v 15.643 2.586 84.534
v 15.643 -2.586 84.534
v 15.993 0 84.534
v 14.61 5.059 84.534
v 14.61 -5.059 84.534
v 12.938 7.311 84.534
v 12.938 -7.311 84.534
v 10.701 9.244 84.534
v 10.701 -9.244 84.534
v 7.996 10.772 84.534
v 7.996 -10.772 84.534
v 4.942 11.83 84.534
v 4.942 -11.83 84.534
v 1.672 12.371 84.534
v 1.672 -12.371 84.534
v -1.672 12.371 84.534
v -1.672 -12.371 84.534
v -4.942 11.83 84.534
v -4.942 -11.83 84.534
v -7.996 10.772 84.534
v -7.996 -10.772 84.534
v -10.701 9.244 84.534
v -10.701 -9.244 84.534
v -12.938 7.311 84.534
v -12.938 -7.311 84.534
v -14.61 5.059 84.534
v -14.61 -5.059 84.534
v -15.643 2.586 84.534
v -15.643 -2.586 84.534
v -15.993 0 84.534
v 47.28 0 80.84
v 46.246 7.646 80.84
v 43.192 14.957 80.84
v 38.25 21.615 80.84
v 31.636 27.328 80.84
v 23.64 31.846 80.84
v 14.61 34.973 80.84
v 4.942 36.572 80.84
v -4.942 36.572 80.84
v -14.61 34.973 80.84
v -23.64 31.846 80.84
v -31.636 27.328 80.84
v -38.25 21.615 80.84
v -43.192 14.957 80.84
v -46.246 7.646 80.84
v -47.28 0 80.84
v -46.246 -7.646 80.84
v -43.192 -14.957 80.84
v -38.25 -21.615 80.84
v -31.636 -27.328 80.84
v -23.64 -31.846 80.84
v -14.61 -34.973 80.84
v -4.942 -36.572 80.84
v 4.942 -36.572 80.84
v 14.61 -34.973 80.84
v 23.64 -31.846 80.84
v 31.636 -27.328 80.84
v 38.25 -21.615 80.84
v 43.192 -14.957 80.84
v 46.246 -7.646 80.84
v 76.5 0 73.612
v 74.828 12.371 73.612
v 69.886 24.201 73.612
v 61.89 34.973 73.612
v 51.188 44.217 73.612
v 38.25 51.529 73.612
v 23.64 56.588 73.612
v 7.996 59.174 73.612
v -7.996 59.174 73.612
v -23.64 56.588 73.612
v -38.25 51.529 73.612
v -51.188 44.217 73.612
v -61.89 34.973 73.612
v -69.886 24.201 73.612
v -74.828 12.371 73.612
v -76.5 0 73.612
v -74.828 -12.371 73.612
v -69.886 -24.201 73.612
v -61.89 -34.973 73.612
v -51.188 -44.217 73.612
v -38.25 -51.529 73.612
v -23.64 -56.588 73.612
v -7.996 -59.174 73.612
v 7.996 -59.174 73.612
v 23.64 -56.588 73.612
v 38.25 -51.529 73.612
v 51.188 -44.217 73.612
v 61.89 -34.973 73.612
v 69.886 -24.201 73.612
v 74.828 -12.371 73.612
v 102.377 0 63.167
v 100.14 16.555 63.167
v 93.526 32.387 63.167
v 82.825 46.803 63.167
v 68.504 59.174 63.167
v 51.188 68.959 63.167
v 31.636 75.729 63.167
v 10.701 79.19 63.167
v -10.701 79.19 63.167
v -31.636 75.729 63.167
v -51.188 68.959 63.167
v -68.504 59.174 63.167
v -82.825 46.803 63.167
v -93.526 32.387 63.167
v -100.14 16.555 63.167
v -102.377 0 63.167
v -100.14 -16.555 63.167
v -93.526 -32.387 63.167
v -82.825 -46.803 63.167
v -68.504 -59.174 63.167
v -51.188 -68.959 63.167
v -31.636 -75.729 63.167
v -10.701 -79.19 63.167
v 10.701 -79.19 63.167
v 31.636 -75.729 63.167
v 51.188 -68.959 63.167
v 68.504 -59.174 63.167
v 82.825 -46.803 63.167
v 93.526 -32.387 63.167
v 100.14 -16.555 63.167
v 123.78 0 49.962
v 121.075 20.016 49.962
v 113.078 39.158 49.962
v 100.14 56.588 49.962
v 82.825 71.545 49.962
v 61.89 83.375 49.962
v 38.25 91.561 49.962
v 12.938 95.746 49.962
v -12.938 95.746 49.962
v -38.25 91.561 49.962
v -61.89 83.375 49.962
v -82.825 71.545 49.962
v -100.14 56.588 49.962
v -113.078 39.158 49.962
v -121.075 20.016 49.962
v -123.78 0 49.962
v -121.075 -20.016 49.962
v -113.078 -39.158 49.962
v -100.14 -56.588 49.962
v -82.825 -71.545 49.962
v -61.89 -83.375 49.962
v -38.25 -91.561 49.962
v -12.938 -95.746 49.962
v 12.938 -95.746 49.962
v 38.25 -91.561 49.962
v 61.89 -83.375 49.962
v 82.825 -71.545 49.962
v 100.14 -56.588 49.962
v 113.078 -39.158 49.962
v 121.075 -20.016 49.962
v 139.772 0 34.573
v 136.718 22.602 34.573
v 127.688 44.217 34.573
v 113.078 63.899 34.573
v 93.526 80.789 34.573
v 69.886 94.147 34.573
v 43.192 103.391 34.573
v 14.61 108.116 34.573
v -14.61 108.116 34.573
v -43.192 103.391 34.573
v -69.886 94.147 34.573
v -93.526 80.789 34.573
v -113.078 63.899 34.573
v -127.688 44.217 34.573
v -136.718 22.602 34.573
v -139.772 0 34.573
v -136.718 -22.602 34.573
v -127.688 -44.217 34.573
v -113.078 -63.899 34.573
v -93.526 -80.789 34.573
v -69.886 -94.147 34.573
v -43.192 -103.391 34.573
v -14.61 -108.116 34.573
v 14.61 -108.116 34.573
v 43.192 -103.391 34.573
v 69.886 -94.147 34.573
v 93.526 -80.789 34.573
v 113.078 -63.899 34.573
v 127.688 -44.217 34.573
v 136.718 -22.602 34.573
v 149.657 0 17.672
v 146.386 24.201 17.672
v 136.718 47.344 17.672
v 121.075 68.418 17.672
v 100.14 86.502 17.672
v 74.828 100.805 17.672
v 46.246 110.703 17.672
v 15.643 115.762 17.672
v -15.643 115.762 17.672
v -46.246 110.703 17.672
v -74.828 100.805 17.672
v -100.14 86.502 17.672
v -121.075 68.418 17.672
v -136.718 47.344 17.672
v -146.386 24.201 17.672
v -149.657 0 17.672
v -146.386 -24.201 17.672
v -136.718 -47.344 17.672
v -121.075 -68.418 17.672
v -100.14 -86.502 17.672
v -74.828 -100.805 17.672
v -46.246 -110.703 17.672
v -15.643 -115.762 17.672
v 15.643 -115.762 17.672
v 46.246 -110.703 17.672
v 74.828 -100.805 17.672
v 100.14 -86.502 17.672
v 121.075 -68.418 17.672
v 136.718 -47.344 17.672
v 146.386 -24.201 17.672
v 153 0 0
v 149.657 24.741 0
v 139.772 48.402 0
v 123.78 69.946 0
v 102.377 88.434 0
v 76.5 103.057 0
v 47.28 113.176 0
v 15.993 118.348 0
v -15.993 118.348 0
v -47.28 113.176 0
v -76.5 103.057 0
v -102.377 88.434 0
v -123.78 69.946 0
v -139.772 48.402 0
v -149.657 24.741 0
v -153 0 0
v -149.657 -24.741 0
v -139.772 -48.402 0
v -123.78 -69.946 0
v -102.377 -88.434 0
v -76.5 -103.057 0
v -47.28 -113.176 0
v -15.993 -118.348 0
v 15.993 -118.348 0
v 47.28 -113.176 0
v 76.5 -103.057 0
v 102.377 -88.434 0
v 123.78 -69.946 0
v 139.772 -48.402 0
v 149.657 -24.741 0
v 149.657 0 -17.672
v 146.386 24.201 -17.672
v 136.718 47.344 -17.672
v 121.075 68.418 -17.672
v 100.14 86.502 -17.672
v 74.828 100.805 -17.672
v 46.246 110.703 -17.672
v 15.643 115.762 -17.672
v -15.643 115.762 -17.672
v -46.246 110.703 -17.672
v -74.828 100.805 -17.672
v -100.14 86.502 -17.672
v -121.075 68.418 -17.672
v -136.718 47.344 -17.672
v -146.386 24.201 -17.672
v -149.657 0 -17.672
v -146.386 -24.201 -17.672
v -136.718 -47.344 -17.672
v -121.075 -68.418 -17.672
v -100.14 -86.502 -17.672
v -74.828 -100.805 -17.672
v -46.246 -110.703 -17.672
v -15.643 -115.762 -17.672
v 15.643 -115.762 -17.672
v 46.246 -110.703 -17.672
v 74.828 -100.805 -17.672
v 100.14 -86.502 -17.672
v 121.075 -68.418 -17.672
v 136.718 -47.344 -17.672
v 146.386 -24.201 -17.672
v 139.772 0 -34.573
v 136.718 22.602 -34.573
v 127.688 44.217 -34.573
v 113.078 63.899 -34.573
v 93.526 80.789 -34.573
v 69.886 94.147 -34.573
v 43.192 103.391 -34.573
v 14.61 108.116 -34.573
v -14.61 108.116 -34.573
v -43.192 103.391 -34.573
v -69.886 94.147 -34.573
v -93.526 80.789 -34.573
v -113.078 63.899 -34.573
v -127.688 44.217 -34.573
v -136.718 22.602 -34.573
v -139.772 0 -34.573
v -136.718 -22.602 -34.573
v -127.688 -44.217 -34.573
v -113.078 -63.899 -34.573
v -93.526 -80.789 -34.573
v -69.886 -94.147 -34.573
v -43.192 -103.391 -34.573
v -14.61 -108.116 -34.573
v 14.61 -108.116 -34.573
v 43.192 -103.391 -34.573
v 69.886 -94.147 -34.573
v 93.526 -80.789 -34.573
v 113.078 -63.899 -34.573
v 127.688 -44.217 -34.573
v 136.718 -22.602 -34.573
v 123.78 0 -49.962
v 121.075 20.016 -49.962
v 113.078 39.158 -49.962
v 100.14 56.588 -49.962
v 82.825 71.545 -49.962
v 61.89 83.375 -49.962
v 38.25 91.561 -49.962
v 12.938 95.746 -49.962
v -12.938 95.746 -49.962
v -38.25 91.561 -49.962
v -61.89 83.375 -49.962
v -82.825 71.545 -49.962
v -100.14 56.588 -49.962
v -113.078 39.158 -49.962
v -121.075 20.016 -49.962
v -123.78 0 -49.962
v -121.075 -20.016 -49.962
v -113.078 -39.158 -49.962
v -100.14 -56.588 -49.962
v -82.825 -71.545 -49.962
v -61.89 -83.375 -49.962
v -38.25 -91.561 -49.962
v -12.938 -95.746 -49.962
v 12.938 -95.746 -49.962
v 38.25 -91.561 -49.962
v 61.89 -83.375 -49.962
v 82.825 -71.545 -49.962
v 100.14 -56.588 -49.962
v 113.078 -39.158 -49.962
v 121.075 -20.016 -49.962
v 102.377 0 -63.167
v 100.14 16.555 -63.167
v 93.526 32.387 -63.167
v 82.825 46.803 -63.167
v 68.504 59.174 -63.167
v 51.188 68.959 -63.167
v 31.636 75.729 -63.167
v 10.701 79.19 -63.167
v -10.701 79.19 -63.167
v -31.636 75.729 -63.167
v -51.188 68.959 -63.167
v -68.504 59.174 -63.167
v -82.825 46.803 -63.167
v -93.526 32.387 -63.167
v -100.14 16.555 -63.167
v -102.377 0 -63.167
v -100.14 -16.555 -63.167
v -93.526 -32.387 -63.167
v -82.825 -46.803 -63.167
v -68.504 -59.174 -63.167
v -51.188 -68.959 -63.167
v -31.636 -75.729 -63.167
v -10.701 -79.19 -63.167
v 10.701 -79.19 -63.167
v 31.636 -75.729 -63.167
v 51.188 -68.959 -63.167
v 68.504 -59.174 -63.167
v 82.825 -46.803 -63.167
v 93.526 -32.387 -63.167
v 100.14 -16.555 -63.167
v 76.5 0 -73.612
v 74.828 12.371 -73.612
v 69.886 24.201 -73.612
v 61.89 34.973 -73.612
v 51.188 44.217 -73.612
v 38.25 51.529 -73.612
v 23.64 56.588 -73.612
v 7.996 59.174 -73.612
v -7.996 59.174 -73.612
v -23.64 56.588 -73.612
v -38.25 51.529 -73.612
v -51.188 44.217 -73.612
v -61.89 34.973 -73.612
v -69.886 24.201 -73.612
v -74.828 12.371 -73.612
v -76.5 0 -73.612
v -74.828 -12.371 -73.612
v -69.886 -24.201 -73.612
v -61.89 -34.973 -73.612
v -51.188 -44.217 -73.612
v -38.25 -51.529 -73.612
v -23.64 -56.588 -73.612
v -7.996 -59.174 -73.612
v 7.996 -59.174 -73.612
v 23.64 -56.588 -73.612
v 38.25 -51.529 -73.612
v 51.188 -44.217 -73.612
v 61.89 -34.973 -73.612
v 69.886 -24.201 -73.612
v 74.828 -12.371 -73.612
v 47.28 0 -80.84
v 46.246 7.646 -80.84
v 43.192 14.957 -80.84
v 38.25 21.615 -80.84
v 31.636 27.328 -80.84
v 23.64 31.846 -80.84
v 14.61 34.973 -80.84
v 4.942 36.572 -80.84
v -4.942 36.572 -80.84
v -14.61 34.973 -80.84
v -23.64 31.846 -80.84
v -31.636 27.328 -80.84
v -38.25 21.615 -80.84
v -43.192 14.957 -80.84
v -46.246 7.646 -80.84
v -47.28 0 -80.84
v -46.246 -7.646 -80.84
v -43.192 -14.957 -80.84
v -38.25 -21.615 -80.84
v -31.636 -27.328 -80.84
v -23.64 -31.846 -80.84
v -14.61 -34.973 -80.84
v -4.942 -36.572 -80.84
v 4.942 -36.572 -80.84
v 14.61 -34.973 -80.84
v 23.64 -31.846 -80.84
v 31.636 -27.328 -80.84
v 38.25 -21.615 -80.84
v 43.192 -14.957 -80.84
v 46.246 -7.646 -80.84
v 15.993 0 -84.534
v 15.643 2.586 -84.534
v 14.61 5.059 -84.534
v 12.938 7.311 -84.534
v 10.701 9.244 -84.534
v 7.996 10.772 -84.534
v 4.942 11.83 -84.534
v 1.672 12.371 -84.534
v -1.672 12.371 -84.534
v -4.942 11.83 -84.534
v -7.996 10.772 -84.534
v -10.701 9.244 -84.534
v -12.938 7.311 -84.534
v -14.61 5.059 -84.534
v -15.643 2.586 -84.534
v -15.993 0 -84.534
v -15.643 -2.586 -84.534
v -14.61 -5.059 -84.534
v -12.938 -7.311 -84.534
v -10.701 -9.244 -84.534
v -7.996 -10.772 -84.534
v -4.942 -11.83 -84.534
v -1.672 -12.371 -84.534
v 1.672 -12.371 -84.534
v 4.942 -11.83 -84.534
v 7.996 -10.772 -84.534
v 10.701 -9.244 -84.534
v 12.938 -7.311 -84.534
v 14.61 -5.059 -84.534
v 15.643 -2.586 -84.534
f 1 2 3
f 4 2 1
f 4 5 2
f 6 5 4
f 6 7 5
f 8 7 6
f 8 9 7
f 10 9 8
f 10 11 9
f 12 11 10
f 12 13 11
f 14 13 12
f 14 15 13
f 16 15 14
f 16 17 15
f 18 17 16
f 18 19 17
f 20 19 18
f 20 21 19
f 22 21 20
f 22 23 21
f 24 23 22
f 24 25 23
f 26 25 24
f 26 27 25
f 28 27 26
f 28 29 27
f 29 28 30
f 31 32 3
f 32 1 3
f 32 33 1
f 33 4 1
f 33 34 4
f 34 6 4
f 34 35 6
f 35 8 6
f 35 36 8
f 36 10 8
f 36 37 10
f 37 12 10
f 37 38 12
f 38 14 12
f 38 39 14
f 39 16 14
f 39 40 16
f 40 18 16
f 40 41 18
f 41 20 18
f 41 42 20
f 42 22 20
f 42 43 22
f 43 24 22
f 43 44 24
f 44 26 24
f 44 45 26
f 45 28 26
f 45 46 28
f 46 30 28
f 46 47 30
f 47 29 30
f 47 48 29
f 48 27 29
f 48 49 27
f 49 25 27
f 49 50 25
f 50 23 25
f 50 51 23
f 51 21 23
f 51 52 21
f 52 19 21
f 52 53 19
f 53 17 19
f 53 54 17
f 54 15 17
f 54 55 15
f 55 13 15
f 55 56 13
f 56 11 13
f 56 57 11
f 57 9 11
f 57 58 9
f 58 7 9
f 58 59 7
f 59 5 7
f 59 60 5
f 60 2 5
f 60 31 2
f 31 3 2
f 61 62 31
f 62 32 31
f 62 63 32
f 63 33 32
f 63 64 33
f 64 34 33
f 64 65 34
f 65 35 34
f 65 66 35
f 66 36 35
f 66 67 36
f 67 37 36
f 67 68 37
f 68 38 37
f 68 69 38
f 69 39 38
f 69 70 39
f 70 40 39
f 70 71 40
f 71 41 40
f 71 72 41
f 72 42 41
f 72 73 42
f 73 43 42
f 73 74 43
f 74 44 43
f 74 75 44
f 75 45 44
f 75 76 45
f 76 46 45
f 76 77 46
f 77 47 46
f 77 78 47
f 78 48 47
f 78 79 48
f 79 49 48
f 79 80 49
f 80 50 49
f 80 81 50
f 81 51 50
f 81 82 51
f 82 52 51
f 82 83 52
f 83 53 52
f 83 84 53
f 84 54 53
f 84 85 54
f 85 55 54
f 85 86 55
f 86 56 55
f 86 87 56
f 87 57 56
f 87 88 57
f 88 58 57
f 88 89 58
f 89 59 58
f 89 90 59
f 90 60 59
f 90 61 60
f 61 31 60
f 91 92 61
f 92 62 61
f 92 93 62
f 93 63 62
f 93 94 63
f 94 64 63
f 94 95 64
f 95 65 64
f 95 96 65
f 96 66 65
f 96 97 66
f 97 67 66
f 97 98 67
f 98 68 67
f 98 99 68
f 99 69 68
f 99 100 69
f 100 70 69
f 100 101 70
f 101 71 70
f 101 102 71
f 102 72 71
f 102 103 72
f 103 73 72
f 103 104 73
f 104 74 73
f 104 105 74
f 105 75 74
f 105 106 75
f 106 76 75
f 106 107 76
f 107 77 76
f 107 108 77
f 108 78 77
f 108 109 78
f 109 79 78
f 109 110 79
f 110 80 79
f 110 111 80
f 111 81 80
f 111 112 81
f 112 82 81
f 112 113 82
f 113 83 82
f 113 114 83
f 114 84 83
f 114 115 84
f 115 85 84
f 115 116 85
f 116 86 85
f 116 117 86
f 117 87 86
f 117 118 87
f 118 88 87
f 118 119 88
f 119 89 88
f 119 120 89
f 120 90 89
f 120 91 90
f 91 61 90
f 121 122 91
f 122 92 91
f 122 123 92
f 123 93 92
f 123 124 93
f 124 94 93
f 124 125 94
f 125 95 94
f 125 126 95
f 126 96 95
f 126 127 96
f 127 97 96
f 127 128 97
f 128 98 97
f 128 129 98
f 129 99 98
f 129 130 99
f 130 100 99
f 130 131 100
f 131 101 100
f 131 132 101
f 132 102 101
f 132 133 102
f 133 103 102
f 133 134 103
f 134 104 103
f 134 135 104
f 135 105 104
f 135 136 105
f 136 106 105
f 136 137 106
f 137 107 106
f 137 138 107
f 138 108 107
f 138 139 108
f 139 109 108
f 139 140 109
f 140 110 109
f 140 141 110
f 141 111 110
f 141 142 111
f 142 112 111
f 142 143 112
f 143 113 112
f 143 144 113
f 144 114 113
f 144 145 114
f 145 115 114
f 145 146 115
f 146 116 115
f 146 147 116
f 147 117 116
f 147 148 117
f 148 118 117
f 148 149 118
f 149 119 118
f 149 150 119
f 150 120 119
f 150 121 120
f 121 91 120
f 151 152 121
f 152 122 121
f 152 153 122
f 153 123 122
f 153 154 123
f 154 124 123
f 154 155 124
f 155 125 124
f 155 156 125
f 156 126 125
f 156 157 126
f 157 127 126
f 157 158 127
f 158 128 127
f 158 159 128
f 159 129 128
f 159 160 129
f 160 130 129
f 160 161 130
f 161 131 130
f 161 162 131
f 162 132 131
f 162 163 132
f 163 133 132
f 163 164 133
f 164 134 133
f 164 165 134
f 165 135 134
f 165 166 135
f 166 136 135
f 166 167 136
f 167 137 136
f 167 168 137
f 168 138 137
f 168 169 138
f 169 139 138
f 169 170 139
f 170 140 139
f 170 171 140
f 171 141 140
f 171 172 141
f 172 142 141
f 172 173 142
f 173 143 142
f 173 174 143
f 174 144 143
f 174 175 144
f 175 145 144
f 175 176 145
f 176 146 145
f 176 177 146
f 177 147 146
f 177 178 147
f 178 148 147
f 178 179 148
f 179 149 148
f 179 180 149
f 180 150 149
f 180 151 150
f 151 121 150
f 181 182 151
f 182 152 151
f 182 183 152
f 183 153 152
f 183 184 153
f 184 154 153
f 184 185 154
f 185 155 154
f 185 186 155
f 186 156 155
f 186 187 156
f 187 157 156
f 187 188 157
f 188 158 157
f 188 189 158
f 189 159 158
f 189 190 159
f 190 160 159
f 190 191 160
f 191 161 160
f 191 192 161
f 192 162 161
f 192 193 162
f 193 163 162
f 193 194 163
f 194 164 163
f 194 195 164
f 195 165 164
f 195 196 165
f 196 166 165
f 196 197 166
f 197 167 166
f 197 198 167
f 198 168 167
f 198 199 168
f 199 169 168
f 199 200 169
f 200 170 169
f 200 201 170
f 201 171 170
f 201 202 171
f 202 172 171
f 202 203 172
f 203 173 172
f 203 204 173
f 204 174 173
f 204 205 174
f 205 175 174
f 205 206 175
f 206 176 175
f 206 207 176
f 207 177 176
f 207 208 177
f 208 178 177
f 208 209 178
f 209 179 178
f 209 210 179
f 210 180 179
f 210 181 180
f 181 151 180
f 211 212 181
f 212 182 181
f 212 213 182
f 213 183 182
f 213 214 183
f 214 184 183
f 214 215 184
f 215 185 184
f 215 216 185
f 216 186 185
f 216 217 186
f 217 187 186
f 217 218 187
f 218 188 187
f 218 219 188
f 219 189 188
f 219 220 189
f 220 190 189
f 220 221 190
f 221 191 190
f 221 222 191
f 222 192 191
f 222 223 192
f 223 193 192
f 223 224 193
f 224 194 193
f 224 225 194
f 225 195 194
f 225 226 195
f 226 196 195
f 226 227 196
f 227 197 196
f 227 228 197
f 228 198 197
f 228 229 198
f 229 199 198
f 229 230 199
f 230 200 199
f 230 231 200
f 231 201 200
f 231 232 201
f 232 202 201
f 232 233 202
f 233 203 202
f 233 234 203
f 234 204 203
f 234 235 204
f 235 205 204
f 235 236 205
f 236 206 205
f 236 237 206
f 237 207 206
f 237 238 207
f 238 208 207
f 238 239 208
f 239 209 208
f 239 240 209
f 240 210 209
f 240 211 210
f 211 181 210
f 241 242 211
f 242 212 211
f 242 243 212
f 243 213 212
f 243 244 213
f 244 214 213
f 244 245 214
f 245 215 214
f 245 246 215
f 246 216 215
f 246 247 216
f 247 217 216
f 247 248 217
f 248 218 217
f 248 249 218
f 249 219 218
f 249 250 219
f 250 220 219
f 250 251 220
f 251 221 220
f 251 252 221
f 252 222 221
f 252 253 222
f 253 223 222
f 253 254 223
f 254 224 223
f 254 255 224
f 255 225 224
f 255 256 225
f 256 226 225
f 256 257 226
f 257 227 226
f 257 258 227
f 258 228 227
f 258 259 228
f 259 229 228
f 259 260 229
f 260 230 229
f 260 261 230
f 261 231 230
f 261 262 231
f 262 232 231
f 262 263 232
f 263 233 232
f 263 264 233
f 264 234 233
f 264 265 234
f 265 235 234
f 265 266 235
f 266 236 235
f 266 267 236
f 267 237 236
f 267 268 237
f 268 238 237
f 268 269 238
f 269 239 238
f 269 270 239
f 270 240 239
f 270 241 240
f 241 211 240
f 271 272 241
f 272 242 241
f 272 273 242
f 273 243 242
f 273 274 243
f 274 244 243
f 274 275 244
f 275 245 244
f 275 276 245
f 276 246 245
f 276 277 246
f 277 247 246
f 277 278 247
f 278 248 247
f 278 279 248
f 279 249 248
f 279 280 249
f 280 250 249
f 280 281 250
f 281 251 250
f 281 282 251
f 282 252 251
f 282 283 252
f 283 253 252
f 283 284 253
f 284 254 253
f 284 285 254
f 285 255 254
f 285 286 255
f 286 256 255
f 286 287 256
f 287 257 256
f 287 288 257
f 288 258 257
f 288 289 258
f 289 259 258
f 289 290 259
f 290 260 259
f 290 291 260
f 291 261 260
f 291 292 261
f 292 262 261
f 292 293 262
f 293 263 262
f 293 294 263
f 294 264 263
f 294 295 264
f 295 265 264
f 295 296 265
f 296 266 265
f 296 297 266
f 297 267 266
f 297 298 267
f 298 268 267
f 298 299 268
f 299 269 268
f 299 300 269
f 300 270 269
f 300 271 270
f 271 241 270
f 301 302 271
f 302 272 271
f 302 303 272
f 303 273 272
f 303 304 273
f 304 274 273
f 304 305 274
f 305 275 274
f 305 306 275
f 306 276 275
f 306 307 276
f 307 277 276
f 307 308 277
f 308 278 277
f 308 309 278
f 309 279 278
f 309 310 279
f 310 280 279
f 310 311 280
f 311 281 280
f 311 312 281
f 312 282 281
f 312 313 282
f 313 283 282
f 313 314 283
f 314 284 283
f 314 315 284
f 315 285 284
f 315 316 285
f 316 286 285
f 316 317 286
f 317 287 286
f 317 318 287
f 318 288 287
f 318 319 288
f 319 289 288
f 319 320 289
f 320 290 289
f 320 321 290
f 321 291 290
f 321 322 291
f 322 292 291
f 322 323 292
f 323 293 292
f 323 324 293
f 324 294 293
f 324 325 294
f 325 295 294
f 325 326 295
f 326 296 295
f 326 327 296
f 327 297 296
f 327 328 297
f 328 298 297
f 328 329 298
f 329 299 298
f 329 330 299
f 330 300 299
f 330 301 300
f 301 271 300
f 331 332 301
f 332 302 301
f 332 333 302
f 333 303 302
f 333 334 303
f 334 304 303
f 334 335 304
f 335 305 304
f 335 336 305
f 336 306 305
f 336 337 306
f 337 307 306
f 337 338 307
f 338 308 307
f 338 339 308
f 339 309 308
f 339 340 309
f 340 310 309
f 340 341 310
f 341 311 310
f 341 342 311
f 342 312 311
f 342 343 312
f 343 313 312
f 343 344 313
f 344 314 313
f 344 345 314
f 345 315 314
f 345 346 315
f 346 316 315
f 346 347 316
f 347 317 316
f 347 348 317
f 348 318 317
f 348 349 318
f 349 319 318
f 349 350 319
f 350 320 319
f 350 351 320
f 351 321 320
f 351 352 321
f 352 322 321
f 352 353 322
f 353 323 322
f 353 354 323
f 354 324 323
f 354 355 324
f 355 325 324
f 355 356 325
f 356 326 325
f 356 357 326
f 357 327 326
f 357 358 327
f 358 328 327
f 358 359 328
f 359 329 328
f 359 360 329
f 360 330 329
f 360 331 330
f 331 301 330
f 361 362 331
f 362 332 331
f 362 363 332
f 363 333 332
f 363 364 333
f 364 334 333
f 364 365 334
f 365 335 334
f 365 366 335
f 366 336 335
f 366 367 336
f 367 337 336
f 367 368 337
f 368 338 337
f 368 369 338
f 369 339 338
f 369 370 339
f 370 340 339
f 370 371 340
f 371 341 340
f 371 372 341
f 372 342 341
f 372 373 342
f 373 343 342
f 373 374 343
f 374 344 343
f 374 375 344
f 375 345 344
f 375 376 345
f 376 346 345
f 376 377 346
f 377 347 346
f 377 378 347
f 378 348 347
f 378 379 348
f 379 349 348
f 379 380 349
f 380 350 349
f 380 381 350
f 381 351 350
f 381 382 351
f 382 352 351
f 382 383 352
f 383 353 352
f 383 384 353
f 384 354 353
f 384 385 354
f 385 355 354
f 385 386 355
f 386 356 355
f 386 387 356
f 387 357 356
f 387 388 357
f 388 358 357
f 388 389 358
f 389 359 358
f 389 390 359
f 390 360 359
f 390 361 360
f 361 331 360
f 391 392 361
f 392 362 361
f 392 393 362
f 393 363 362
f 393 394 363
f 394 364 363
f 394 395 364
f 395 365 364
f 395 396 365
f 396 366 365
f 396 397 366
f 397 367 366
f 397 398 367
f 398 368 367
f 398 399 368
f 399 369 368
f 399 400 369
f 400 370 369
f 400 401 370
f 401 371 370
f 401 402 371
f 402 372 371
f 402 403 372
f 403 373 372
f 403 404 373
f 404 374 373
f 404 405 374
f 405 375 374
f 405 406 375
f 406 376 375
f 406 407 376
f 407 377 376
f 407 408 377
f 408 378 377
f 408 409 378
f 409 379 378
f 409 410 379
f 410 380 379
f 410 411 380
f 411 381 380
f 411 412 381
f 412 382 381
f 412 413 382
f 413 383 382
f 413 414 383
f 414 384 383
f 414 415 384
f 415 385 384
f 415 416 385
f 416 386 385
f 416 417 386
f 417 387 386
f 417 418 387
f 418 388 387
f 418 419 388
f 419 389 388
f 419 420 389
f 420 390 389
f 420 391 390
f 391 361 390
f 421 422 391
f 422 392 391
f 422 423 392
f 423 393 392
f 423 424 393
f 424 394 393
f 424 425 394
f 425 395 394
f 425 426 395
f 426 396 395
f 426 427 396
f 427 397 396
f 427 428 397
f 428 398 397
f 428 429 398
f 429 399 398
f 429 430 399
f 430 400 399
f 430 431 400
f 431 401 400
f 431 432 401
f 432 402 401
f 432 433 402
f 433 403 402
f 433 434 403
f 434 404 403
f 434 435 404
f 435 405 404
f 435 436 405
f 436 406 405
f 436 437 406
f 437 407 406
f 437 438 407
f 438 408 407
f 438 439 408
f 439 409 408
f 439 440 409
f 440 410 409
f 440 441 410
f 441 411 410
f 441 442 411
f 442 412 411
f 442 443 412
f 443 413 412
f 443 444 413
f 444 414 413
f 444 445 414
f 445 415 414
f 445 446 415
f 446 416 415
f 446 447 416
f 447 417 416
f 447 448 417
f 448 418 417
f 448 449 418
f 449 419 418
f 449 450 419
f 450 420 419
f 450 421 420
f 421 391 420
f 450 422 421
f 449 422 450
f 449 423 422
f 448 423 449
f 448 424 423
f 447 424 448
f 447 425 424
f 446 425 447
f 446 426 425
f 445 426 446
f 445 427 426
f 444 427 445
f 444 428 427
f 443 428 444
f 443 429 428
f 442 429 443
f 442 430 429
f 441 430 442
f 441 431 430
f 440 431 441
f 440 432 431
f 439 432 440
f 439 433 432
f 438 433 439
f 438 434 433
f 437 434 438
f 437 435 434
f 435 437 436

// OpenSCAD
// Generated by SolidPython 1.0.1 on 2020-07-29 00:46:48


scale(v = [9, 7, 5]) {
	sphere(r = 17);
}
/***********************************************
*********      SolidPython code:      **********
************************************************
 
# import packages: SolidPython
from solid import *
from solid.utils import *
from itertools import chain, combinations, permutations


class Resize:

    def __init__(self, scad_file):
        self.scad_file = scad_file
        #self.scad_file = import_scad(scad_file)
        # cone/cylinder param:
        self.r1 = 0
        self.r2 = 0
        self.h = 0
        # rectangular prism param:
        self.w = 0
        self.l = 0
        # ellipse param:
        self.r = 0

    # import OpenScad code (file name corresponds to shape)


    # classify shape + parameters
    def assign(self, param1, param2, param3):
        if self.scad_file == 'cone.scad':
            self.r1 = param1
            self.r2 = param2
            self.h = param3
        elif self.scad_file == 'cylinder.scad':
            self.r1 = param1
            self.r2 = param2
            self.h = param3
        elif self.scad_file == 'rectangularPrism.scad':
            self.h = param1
            self.l = param2
            self.w = param3
        else:
            self.r = param1
            self.h = param2

    # resize parameters
    def iterate(self):
        x = range(3, 20, 2)
        i = 1
        if self.scad_file == 'cone.scad':
            tempList = list(permutations(x, 2))
            for temp in tempList:
                param1 = temp[0]
                param2 = temp[1]
                filepath = 'produced_scad_files/' + 'cone' + str(param1) + '_' + str(param2) + '_' + '.scad'
                scad_render_to_file(cylinder(h=param1, r1=param2, r2=0), filepath)

        elif self.scad_file == 'cylinder.scad':
            tempList = list(permutations(x, 3))
            for temp in tempList:
                param1 = temp[0]
                param2 = temp[1]
                filepath = 'produced_scad_files/' + 'cylinder' + str(param1) + '_' + str(param2) + '_' + '.scad'
                scad_render_to_file(cylinder(h=param1, r1=param2, r2=param2), filepath)

        elif self.scad_file == 'rectangularPrism.scad':
            tempList = list(permutations(x, 3))
            for temp in tempList:
                param1 = temp[0]
                param2 = temp[1]
                param3 = temp[2]
                filepath = 'produced_scad_files/' + 'rectangularPrism' + str(param1) + '_' + str(param2) + '_' + str(
                    param3) + '.scad'
                scad_render_to_file(cube(size=(param1, param2, param3)), filepath)

        elif self.scad_file == 'ellipse.scad':
            tempList = list(permutations(x, 4))
            for temp in tempList:
                param1 = temp[0]
                param2 = temp[1]
                param3 = temp[2]
                param4 = temp[3]
                filepath = 'produced_scad_files/' + 'ellipse' + str(param1) + '_' + str(param2) + '_' + str(param3) + '_' + str(param4) + '.scad'
                scad_render_to_file(scale([param1, param2, param3])(sphere(r=param4)), filepath)

    def render_to_scadfile(self):
        scad_render_to_file(scad, 'example.scad') 
 
************************************************/
